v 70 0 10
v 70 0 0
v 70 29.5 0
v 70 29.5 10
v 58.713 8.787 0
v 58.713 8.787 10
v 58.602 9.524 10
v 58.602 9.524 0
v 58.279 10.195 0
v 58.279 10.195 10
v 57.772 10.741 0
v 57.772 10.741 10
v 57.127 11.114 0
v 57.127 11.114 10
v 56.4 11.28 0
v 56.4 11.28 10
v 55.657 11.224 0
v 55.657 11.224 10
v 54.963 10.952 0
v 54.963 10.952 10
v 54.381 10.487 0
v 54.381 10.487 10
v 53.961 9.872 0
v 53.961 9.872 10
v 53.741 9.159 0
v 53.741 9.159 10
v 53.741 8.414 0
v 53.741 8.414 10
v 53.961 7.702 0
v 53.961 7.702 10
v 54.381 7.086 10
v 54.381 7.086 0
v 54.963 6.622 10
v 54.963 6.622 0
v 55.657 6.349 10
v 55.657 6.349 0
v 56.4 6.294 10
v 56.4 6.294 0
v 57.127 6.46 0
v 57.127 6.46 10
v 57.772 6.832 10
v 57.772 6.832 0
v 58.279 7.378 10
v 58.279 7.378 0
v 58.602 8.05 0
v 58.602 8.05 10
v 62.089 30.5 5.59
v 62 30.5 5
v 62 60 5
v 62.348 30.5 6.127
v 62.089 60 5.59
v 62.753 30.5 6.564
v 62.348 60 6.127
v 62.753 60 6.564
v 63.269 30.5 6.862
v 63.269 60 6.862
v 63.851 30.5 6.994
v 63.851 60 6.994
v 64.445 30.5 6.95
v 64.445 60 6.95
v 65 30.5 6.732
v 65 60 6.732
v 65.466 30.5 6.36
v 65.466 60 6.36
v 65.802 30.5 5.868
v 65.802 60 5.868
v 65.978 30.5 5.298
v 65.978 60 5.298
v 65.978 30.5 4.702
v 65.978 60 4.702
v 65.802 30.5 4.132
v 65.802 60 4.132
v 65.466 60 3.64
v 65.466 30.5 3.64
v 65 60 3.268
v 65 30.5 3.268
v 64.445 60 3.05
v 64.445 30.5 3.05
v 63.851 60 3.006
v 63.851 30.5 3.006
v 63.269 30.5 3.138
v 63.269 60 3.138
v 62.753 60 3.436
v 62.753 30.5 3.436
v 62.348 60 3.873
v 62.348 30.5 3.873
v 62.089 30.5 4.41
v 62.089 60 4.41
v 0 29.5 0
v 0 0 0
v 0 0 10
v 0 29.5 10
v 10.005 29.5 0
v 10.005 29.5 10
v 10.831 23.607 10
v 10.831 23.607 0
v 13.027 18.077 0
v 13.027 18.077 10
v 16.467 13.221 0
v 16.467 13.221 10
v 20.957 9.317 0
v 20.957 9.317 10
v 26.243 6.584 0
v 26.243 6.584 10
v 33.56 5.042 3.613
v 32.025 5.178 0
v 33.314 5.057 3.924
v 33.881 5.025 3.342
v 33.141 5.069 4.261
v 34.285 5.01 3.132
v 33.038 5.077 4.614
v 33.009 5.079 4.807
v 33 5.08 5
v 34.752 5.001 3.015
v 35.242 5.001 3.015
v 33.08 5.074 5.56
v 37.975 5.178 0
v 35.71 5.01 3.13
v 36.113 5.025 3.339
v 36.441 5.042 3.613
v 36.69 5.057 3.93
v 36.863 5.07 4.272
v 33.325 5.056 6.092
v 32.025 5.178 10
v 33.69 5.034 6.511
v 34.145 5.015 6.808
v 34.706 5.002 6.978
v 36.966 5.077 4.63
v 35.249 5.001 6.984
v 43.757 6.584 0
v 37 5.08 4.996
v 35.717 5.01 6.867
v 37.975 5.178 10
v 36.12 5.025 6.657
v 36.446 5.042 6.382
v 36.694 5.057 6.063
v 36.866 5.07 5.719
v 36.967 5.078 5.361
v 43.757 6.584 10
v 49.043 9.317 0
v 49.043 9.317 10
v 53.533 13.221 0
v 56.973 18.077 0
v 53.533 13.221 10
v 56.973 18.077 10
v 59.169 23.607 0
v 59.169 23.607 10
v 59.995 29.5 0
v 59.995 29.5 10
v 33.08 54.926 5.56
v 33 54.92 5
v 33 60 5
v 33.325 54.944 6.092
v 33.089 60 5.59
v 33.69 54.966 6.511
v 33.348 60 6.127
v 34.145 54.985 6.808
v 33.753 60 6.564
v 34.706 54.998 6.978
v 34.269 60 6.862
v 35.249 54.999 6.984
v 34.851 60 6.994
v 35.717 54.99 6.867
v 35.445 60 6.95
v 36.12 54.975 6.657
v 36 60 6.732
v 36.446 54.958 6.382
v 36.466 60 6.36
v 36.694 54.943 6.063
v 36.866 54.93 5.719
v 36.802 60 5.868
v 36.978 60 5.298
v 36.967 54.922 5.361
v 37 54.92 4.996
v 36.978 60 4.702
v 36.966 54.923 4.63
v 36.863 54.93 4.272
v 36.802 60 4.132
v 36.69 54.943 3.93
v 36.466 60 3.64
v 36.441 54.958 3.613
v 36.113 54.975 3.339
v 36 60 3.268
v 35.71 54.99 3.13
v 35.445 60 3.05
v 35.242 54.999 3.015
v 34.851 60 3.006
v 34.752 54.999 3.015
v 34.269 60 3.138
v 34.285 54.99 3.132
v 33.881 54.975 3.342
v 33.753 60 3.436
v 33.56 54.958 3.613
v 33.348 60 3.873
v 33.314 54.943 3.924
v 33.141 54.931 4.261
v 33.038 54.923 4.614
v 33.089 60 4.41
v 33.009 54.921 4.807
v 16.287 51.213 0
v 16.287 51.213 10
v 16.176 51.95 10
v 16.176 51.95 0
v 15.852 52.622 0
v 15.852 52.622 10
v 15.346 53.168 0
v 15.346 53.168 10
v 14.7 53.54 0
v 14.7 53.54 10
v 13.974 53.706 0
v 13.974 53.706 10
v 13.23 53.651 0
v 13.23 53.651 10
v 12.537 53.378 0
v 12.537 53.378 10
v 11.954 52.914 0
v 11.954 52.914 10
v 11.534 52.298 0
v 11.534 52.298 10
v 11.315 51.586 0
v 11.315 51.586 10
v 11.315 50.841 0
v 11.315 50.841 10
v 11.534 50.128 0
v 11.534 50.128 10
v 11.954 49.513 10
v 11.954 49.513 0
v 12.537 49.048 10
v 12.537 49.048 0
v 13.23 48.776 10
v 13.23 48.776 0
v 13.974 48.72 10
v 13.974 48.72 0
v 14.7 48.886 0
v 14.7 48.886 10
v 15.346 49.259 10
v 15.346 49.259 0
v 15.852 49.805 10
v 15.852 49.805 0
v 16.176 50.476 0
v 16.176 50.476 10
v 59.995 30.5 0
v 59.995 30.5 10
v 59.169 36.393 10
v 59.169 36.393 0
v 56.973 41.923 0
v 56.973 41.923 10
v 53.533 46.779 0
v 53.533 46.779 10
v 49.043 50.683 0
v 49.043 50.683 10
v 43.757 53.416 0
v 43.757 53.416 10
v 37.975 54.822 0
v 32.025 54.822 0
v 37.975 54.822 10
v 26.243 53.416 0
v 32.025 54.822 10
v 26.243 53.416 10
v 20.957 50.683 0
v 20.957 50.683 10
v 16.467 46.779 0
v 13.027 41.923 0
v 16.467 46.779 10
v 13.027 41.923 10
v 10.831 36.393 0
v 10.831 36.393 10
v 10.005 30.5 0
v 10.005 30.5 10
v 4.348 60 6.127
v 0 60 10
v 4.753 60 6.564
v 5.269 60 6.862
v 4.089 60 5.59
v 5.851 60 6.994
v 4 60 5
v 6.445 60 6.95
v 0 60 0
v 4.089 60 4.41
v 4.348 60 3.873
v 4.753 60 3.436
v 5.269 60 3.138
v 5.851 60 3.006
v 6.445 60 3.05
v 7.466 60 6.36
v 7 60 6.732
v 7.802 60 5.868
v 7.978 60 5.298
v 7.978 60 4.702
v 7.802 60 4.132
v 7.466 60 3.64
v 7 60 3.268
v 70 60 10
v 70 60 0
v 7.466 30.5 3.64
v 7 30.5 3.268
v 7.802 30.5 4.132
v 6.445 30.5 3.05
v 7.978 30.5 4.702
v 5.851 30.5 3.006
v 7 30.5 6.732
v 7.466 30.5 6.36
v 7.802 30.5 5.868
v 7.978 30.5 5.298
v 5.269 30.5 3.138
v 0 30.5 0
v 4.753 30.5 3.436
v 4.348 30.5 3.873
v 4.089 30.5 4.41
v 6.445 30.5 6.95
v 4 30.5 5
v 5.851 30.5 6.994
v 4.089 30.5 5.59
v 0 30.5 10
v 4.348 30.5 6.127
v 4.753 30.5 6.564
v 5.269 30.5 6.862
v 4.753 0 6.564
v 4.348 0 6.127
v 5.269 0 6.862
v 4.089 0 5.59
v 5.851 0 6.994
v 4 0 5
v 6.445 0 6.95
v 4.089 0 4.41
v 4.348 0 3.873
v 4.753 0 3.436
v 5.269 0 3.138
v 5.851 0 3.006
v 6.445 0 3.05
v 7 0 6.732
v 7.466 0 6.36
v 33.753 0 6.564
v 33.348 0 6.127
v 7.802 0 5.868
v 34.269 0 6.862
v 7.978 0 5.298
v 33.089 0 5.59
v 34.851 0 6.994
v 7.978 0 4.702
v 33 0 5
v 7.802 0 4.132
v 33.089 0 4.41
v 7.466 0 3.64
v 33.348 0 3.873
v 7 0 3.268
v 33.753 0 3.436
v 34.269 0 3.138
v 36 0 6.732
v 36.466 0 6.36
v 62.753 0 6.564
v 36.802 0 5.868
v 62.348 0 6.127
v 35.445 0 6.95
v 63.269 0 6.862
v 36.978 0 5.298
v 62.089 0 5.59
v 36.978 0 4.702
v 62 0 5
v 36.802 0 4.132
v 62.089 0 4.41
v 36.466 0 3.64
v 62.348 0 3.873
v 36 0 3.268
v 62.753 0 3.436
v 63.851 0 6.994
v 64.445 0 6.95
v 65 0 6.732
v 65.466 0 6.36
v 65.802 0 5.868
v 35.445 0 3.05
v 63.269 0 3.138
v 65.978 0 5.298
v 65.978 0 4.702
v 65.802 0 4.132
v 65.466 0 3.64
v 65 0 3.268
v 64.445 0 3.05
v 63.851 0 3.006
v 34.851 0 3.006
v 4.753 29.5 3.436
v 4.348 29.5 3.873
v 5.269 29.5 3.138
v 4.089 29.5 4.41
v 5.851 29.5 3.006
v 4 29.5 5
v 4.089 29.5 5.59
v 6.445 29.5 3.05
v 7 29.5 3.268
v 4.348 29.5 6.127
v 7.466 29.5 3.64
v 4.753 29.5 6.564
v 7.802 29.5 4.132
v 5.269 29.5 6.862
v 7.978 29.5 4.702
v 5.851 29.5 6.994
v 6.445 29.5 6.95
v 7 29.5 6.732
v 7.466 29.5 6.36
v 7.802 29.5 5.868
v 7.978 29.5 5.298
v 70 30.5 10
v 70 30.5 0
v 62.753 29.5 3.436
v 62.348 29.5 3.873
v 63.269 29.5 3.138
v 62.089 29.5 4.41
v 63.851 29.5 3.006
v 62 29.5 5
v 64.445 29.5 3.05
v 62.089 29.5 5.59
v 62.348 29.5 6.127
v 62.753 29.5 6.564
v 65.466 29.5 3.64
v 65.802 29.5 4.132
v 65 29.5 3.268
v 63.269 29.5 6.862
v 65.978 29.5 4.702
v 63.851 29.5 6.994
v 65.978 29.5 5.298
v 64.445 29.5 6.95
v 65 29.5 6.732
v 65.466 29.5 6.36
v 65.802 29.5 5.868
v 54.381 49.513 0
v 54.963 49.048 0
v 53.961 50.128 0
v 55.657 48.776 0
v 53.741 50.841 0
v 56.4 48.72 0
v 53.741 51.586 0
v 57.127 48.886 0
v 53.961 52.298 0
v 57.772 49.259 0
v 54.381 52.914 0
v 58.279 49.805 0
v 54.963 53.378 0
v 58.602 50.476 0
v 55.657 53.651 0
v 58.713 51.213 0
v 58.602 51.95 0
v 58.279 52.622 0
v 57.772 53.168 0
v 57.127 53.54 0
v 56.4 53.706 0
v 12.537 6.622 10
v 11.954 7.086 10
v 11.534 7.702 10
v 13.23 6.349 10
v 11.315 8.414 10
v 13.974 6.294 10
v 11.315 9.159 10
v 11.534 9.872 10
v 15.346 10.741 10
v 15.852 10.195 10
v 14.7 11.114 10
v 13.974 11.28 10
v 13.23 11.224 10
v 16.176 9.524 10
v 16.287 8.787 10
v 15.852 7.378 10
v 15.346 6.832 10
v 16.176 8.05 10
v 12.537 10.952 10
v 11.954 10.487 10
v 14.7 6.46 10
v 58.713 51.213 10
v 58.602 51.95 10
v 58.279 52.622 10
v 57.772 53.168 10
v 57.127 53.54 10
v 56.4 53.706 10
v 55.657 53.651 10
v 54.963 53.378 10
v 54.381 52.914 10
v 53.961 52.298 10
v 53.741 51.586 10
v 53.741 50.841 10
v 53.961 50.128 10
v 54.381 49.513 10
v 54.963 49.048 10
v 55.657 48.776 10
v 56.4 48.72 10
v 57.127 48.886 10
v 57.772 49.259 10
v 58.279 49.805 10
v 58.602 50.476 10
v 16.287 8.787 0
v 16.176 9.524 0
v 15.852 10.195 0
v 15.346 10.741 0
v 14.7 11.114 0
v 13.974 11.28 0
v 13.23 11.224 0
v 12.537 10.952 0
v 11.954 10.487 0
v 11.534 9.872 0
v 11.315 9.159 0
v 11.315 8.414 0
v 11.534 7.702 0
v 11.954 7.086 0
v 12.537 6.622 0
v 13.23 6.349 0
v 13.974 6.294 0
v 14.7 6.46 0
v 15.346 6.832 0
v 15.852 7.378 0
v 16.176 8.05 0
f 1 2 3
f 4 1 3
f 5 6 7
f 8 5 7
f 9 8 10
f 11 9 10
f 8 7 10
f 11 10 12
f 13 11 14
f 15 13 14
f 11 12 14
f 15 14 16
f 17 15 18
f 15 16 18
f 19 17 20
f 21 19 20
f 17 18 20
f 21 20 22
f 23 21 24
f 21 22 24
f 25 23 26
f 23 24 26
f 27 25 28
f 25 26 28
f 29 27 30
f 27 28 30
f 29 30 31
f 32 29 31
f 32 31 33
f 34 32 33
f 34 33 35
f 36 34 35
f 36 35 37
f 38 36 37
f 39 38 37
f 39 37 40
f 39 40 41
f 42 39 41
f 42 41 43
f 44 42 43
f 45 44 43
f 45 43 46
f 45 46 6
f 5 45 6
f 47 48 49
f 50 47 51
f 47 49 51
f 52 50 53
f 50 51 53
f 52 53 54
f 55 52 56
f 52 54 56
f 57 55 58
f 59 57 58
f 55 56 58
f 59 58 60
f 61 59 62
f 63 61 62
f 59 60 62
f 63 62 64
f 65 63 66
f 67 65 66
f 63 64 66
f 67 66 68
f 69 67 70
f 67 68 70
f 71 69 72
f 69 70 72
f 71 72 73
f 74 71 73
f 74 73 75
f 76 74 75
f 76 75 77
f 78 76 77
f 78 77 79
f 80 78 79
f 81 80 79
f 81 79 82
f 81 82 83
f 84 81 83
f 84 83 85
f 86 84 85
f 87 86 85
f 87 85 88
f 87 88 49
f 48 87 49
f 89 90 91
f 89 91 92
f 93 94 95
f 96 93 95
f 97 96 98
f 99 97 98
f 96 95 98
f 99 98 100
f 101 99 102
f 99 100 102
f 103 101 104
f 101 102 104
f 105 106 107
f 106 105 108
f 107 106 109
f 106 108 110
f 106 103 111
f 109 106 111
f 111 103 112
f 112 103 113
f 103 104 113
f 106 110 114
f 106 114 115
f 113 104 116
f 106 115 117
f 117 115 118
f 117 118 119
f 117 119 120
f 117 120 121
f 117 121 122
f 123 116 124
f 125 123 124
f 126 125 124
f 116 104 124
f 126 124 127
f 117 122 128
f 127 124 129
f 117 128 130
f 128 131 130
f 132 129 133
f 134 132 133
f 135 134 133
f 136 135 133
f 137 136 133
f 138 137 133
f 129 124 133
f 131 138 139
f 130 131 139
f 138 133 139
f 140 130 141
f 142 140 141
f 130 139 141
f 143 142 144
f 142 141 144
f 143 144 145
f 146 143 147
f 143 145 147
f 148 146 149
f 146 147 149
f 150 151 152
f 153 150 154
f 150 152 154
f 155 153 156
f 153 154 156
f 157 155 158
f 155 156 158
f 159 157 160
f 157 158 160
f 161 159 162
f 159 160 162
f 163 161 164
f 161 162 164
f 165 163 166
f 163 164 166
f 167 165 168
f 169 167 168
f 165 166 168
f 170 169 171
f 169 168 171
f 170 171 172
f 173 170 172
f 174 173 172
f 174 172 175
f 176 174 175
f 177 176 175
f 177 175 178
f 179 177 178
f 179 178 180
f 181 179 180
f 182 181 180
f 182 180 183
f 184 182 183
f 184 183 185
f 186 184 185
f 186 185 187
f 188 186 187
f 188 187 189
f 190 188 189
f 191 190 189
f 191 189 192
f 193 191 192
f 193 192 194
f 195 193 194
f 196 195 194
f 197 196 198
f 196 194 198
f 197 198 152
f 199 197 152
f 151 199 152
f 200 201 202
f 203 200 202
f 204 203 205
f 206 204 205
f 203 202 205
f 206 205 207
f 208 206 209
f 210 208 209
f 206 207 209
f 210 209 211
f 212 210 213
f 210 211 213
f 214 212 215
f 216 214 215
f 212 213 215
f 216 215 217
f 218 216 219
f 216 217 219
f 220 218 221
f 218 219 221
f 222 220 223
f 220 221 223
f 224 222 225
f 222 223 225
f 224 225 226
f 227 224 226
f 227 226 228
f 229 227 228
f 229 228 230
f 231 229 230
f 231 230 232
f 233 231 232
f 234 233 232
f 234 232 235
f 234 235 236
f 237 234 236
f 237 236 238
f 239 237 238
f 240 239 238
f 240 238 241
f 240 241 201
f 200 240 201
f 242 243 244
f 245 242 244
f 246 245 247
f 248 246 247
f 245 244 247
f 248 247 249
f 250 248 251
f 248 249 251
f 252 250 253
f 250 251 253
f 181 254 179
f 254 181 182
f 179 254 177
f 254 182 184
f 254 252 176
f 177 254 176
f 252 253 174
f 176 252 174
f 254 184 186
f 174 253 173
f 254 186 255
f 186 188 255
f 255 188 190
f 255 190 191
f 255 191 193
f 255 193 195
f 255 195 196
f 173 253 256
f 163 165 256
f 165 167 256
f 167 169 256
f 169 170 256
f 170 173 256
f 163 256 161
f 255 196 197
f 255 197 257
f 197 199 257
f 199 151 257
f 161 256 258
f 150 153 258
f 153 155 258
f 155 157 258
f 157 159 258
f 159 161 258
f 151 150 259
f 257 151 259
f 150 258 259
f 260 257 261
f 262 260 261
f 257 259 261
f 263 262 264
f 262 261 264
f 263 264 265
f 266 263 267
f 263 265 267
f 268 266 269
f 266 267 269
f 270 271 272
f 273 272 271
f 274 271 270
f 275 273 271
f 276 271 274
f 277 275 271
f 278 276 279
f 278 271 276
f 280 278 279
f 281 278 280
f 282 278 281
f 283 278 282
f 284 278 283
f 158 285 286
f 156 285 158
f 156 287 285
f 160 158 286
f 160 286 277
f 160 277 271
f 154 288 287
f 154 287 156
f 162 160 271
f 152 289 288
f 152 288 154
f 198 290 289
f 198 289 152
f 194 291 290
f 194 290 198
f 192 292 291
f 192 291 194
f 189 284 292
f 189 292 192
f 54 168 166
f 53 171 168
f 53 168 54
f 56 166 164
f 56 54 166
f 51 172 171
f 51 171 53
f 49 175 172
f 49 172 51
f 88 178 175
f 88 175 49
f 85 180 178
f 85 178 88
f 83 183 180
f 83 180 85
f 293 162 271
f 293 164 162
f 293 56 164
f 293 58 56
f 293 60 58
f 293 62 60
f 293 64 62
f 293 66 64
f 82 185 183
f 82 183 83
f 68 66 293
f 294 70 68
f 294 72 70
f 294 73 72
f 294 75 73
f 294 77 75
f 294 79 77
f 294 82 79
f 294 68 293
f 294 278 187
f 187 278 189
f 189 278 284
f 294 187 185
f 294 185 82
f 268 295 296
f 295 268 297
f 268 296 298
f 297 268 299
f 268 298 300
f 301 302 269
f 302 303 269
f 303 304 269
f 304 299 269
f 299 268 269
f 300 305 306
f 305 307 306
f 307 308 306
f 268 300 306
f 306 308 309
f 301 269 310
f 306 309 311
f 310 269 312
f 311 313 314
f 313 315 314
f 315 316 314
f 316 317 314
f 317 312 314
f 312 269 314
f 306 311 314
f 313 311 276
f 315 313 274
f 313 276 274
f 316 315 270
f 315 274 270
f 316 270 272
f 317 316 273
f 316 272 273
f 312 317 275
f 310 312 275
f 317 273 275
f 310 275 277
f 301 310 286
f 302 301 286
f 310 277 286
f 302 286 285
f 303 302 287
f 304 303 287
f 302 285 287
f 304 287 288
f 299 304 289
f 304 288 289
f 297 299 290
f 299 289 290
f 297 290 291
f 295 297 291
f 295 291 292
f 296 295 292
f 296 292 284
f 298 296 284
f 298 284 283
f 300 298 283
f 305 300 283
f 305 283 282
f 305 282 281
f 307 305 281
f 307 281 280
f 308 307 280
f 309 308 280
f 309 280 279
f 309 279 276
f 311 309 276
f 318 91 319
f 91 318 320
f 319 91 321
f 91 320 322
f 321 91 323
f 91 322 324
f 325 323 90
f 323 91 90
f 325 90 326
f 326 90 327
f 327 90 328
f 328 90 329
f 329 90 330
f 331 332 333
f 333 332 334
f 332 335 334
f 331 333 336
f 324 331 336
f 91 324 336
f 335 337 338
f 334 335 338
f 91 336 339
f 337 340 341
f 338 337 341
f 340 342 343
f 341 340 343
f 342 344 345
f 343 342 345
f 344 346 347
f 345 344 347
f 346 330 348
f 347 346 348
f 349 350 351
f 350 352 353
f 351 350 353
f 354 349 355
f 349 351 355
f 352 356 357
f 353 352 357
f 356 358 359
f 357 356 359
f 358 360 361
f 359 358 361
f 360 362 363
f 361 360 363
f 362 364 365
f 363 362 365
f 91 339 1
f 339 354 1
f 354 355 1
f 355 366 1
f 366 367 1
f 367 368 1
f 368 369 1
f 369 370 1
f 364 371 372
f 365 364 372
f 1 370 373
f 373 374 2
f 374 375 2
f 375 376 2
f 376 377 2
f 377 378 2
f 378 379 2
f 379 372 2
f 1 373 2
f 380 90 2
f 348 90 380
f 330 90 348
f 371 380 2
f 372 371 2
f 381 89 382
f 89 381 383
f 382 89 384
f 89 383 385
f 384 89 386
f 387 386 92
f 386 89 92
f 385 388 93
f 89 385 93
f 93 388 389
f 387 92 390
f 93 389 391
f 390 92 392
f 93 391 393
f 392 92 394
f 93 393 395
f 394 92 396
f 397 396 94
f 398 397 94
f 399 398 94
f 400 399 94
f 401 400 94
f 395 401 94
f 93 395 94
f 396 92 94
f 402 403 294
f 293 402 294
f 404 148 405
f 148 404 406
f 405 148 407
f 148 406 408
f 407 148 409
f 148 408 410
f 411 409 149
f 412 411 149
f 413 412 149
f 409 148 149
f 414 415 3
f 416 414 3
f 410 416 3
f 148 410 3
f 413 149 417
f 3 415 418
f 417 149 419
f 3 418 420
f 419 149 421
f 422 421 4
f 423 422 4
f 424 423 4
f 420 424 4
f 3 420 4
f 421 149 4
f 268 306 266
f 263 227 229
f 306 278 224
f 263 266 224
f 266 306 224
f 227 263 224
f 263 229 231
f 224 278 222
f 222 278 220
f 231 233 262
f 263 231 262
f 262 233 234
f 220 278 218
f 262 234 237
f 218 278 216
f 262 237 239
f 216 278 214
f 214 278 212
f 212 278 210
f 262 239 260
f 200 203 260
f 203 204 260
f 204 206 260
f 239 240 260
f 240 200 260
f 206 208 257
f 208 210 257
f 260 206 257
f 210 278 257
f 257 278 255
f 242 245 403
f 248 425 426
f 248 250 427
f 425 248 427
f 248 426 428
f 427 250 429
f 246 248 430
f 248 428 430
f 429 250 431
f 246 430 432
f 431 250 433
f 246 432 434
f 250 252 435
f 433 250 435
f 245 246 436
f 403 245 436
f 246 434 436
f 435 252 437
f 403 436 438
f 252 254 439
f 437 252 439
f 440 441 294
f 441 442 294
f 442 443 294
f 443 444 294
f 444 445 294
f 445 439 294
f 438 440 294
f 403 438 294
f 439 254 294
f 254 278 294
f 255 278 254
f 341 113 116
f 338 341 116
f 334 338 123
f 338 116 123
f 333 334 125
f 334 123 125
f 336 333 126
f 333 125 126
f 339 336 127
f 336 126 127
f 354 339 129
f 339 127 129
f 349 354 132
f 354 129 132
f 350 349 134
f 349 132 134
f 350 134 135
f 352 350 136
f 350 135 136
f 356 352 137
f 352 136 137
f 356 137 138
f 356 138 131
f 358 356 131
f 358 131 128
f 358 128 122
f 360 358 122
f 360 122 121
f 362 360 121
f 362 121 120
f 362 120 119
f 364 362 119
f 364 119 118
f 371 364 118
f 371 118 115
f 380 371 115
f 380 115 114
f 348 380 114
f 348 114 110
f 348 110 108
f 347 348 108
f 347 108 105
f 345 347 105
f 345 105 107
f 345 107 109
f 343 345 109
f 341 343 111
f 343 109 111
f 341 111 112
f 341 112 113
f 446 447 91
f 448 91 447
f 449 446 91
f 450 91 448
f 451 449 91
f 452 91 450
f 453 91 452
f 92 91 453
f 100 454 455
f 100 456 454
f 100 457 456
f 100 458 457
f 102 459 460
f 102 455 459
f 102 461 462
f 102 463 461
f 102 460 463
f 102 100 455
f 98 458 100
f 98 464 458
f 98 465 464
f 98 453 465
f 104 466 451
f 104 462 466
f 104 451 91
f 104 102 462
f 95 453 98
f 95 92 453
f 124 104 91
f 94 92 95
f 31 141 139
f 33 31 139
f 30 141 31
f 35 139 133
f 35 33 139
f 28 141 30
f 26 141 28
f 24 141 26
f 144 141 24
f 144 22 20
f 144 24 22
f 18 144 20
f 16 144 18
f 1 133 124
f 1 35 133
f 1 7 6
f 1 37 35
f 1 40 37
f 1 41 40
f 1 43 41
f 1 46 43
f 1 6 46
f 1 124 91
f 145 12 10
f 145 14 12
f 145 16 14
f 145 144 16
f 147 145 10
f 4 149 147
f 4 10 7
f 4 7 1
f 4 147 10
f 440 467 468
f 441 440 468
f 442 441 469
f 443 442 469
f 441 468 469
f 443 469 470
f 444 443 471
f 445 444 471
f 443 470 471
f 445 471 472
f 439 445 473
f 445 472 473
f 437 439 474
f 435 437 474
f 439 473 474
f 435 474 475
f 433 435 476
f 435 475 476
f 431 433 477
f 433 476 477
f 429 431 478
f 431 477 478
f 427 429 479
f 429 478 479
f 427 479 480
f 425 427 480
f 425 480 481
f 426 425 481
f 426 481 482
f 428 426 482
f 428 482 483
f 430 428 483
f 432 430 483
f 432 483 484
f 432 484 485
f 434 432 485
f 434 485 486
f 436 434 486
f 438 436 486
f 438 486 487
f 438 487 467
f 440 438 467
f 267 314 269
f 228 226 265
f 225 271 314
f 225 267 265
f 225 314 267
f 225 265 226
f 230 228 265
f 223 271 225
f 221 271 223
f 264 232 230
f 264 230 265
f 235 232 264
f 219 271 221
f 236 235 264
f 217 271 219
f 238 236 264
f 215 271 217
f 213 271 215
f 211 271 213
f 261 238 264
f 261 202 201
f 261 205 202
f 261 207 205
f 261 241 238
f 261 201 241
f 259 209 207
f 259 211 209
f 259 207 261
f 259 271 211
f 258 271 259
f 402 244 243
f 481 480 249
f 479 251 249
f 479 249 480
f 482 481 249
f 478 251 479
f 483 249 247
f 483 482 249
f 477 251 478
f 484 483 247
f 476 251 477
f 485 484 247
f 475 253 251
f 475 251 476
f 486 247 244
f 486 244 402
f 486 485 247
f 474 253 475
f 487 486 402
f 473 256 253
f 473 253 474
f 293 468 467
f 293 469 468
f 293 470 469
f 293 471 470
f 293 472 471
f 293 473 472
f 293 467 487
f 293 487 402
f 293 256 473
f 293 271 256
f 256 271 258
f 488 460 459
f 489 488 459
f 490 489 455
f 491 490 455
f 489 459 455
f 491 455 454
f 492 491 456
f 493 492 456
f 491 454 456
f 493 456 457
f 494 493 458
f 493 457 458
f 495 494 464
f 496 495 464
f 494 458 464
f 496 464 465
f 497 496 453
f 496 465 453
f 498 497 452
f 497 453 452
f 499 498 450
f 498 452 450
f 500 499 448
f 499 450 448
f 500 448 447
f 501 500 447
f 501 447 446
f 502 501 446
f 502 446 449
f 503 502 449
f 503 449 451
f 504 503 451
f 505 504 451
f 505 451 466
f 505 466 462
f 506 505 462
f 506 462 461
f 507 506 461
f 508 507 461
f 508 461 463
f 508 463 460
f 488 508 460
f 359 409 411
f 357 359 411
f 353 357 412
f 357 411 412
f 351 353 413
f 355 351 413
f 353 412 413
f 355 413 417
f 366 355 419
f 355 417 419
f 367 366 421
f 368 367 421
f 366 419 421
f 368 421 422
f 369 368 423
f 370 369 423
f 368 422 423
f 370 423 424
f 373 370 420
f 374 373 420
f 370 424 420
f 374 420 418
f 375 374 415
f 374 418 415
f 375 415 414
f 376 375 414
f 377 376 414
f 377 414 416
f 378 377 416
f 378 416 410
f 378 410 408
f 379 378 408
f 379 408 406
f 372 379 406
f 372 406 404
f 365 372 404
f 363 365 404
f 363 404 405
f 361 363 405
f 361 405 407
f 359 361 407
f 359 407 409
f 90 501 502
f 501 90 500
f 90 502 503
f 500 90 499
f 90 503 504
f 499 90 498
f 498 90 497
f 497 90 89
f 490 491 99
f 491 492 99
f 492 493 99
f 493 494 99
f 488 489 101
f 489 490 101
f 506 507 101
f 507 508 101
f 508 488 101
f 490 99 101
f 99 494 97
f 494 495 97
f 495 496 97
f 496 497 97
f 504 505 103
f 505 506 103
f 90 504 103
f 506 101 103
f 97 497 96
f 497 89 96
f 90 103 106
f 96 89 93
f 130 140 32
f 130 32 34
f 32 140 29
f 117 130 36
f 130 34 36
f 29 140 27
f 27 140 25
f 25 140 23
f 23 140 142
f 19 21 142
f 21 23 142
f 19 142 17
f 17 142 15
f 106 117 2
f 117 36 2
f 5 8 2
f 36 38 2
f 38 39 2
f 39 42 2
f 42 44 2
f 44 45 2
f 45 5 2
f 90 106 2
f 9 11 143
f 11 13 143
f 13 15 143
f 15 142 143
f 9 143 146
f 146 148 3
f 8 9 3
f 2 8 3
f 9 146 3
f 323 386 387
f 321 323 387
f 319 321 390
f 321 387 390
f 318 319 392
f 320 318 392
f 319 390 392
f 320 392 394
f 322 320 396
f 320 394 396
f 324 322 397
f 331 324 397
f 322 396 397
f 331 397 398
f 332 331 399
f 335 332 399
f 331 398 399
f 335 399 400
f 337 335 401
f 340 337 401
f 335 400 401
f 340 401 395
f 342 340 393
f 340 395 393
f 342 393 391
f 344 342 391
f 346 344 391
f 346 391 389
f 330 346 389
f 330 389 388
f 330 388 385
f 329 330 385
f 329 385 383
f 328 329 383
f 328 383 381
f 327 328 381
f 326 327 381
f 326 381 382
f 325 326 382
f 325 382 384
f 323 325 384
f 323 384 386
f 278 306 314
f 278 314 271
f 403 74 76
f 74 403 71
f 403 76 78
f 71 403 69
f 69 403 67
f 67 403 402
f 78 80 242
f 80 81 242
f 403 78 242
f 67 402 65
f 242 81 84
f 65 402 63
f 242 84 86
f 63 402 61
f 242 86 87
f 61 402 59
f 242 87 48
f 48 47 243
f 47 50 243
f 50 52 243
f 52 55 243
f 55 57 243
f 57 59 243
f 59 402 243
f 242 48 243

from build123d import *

# Parameters (mm, degrees)
SKETCH1_W           = 70
SKETCH1_H           = 60
BOSS_EXTRUDE1_DEPTH = 10
CUT_EXTRUDE1_DEPTH  = 10
SKETCH3_R           = 2
CUT_EXTRUDE2_DEPTH  = 93.736184955
SKETCH6_R           = 2.5
CUT_EXTRUDE3_DEPTH  = 93.73618503


with BuildPart() as part:
    # Sketch1 → Boss-Extrude1 (new body)
    with BuildSketch(Plane.XY):
        with Locations((35, 30)):
            Rectangle(SKETCH1_W, SKETCH1_H)
    extrude(amount=BOSS_EXTRUDE1_DEPTH)

    # Sketch2 → Cut-Extrude1 (cut)
    with BuildSketch(Plane.XY.offset(10)):
        with BuildLine():
            Line((10.0050005, 30.5), (0, 30.5))
            Line((0, 30.5), (0, 29.5))
            Line((0, 29.5), (10.0050005, 29.5))
            ThreePointArc((10.0050005, 29.5), (35, 5), (59.9949995, 29.5))
            Line((59.9949995, 29.5), (70, 29.5))
            Line((70, 29.5), (70, 30.5))
            Line((70, 30.5), (59.9949995, 30.5))
            ThreePointArc((59.9949995, 30.5), (35, 55), (10.0050005, 30.5))
        make_face()
    extrude(amount=-CUT_EXTRUDE1_DEPTH, mode=Mode.SUBTRACT)


with BuildPart() as cut_extrude1_piece_1:
    # of the separate pieces the step leaves, piece 1, a body of its own (cut_extrude1_pieces)
    add(part.part.solids().sort_by_distance((0, 0, 0))[0])


with BuildPart() as cut_extrude1_piece_2:
    # of the separate pieces the step leaves, piece 2, a body of its own (cut_extrude1_pieces)
    add(part.part.solids().sort_by_distance((0, 60, 0))[0])


with BuildPart() as cut_extrude2_tool:
    # Sketch3 → Cut-Extrude2 (new, through all)
    with BuildSketch(Plane(origin=(0, 60, 0), x_dir=(1, 0, 0), z_dir=(0, 1, 0))):
        with Locations(Location((6, -5, 0), (0, 0, 180))):
            Circle(SKETCH3_R)
        with Locations(Location((64, -5, 0), (0, 0, 180))):
            Circle(SKETCH3_R)
        with Locations(Location((35, -5, 0), (0, 0, 180))):
            Circle(SKETCH3_R)
    extrude(amount=-CUT_EXTRUDE2_DEPTH)


with BuildPart() as cut_extrude1_piece_1_1:
    add(cut_extrude1_piece_1.part)

    # Cut-Extrude2: cut by cut_extrude2_tool
    add(cut_extrude2_tool.part, mode=Mode.SUBTRACT)


with BuildPart() as cut_extrude1_piece_2_1:
    add(cut_extrude1_piece_2.part)

    # Cut-Extrude2: cut by cut_extrude2_tool
    add(cut_extrude2_tool.part, mode=Mode.SUBTRACT)


with BuildPart() as cut_extrude3_tool:
    # Sketch6 → Cut-Extrude3 (new, through all)
    with BuildSketch(Plane.XY.offset(10)):
        with Locations((13.786796564, 51.213203436)):
            Circle(SKETCH6_R)
        with Locations((56.213203436, 51.213203436)):
            Circle(SKETCH6_R)
        with Locations((56.213203436, 8.786796564)):
            Circle(SKETCH6_R)
        with Locations((13.786796564, 8.786796564)):
            Circle(SKETCH6_R)
    extrude(amount=-CUT_EXTRUDE3_DEPTH)


with BuildPart() as cut_extrude1_piece_1_2:
    add(cut_extrude1_piece_1_1.part)

    # Cut-Extrude3: cut by cut_extrude3_tool
    add(cut_extrude3_tool.part, mode=Mode.SUBTRACT)


with BuildPart() as cut_extrude1_piece_2_2:
    add(cut_extrude1_piece_2_1.part)

    # Cut-Extrude3: cut by cut_extrude3_tool
    add(cut_extrude3_tool.part, mode=Mode.SUBTRACT)


solid = Compound([cut_extrude1_piece_1_2.part, cut_extrude1_piece_2_2.part])
